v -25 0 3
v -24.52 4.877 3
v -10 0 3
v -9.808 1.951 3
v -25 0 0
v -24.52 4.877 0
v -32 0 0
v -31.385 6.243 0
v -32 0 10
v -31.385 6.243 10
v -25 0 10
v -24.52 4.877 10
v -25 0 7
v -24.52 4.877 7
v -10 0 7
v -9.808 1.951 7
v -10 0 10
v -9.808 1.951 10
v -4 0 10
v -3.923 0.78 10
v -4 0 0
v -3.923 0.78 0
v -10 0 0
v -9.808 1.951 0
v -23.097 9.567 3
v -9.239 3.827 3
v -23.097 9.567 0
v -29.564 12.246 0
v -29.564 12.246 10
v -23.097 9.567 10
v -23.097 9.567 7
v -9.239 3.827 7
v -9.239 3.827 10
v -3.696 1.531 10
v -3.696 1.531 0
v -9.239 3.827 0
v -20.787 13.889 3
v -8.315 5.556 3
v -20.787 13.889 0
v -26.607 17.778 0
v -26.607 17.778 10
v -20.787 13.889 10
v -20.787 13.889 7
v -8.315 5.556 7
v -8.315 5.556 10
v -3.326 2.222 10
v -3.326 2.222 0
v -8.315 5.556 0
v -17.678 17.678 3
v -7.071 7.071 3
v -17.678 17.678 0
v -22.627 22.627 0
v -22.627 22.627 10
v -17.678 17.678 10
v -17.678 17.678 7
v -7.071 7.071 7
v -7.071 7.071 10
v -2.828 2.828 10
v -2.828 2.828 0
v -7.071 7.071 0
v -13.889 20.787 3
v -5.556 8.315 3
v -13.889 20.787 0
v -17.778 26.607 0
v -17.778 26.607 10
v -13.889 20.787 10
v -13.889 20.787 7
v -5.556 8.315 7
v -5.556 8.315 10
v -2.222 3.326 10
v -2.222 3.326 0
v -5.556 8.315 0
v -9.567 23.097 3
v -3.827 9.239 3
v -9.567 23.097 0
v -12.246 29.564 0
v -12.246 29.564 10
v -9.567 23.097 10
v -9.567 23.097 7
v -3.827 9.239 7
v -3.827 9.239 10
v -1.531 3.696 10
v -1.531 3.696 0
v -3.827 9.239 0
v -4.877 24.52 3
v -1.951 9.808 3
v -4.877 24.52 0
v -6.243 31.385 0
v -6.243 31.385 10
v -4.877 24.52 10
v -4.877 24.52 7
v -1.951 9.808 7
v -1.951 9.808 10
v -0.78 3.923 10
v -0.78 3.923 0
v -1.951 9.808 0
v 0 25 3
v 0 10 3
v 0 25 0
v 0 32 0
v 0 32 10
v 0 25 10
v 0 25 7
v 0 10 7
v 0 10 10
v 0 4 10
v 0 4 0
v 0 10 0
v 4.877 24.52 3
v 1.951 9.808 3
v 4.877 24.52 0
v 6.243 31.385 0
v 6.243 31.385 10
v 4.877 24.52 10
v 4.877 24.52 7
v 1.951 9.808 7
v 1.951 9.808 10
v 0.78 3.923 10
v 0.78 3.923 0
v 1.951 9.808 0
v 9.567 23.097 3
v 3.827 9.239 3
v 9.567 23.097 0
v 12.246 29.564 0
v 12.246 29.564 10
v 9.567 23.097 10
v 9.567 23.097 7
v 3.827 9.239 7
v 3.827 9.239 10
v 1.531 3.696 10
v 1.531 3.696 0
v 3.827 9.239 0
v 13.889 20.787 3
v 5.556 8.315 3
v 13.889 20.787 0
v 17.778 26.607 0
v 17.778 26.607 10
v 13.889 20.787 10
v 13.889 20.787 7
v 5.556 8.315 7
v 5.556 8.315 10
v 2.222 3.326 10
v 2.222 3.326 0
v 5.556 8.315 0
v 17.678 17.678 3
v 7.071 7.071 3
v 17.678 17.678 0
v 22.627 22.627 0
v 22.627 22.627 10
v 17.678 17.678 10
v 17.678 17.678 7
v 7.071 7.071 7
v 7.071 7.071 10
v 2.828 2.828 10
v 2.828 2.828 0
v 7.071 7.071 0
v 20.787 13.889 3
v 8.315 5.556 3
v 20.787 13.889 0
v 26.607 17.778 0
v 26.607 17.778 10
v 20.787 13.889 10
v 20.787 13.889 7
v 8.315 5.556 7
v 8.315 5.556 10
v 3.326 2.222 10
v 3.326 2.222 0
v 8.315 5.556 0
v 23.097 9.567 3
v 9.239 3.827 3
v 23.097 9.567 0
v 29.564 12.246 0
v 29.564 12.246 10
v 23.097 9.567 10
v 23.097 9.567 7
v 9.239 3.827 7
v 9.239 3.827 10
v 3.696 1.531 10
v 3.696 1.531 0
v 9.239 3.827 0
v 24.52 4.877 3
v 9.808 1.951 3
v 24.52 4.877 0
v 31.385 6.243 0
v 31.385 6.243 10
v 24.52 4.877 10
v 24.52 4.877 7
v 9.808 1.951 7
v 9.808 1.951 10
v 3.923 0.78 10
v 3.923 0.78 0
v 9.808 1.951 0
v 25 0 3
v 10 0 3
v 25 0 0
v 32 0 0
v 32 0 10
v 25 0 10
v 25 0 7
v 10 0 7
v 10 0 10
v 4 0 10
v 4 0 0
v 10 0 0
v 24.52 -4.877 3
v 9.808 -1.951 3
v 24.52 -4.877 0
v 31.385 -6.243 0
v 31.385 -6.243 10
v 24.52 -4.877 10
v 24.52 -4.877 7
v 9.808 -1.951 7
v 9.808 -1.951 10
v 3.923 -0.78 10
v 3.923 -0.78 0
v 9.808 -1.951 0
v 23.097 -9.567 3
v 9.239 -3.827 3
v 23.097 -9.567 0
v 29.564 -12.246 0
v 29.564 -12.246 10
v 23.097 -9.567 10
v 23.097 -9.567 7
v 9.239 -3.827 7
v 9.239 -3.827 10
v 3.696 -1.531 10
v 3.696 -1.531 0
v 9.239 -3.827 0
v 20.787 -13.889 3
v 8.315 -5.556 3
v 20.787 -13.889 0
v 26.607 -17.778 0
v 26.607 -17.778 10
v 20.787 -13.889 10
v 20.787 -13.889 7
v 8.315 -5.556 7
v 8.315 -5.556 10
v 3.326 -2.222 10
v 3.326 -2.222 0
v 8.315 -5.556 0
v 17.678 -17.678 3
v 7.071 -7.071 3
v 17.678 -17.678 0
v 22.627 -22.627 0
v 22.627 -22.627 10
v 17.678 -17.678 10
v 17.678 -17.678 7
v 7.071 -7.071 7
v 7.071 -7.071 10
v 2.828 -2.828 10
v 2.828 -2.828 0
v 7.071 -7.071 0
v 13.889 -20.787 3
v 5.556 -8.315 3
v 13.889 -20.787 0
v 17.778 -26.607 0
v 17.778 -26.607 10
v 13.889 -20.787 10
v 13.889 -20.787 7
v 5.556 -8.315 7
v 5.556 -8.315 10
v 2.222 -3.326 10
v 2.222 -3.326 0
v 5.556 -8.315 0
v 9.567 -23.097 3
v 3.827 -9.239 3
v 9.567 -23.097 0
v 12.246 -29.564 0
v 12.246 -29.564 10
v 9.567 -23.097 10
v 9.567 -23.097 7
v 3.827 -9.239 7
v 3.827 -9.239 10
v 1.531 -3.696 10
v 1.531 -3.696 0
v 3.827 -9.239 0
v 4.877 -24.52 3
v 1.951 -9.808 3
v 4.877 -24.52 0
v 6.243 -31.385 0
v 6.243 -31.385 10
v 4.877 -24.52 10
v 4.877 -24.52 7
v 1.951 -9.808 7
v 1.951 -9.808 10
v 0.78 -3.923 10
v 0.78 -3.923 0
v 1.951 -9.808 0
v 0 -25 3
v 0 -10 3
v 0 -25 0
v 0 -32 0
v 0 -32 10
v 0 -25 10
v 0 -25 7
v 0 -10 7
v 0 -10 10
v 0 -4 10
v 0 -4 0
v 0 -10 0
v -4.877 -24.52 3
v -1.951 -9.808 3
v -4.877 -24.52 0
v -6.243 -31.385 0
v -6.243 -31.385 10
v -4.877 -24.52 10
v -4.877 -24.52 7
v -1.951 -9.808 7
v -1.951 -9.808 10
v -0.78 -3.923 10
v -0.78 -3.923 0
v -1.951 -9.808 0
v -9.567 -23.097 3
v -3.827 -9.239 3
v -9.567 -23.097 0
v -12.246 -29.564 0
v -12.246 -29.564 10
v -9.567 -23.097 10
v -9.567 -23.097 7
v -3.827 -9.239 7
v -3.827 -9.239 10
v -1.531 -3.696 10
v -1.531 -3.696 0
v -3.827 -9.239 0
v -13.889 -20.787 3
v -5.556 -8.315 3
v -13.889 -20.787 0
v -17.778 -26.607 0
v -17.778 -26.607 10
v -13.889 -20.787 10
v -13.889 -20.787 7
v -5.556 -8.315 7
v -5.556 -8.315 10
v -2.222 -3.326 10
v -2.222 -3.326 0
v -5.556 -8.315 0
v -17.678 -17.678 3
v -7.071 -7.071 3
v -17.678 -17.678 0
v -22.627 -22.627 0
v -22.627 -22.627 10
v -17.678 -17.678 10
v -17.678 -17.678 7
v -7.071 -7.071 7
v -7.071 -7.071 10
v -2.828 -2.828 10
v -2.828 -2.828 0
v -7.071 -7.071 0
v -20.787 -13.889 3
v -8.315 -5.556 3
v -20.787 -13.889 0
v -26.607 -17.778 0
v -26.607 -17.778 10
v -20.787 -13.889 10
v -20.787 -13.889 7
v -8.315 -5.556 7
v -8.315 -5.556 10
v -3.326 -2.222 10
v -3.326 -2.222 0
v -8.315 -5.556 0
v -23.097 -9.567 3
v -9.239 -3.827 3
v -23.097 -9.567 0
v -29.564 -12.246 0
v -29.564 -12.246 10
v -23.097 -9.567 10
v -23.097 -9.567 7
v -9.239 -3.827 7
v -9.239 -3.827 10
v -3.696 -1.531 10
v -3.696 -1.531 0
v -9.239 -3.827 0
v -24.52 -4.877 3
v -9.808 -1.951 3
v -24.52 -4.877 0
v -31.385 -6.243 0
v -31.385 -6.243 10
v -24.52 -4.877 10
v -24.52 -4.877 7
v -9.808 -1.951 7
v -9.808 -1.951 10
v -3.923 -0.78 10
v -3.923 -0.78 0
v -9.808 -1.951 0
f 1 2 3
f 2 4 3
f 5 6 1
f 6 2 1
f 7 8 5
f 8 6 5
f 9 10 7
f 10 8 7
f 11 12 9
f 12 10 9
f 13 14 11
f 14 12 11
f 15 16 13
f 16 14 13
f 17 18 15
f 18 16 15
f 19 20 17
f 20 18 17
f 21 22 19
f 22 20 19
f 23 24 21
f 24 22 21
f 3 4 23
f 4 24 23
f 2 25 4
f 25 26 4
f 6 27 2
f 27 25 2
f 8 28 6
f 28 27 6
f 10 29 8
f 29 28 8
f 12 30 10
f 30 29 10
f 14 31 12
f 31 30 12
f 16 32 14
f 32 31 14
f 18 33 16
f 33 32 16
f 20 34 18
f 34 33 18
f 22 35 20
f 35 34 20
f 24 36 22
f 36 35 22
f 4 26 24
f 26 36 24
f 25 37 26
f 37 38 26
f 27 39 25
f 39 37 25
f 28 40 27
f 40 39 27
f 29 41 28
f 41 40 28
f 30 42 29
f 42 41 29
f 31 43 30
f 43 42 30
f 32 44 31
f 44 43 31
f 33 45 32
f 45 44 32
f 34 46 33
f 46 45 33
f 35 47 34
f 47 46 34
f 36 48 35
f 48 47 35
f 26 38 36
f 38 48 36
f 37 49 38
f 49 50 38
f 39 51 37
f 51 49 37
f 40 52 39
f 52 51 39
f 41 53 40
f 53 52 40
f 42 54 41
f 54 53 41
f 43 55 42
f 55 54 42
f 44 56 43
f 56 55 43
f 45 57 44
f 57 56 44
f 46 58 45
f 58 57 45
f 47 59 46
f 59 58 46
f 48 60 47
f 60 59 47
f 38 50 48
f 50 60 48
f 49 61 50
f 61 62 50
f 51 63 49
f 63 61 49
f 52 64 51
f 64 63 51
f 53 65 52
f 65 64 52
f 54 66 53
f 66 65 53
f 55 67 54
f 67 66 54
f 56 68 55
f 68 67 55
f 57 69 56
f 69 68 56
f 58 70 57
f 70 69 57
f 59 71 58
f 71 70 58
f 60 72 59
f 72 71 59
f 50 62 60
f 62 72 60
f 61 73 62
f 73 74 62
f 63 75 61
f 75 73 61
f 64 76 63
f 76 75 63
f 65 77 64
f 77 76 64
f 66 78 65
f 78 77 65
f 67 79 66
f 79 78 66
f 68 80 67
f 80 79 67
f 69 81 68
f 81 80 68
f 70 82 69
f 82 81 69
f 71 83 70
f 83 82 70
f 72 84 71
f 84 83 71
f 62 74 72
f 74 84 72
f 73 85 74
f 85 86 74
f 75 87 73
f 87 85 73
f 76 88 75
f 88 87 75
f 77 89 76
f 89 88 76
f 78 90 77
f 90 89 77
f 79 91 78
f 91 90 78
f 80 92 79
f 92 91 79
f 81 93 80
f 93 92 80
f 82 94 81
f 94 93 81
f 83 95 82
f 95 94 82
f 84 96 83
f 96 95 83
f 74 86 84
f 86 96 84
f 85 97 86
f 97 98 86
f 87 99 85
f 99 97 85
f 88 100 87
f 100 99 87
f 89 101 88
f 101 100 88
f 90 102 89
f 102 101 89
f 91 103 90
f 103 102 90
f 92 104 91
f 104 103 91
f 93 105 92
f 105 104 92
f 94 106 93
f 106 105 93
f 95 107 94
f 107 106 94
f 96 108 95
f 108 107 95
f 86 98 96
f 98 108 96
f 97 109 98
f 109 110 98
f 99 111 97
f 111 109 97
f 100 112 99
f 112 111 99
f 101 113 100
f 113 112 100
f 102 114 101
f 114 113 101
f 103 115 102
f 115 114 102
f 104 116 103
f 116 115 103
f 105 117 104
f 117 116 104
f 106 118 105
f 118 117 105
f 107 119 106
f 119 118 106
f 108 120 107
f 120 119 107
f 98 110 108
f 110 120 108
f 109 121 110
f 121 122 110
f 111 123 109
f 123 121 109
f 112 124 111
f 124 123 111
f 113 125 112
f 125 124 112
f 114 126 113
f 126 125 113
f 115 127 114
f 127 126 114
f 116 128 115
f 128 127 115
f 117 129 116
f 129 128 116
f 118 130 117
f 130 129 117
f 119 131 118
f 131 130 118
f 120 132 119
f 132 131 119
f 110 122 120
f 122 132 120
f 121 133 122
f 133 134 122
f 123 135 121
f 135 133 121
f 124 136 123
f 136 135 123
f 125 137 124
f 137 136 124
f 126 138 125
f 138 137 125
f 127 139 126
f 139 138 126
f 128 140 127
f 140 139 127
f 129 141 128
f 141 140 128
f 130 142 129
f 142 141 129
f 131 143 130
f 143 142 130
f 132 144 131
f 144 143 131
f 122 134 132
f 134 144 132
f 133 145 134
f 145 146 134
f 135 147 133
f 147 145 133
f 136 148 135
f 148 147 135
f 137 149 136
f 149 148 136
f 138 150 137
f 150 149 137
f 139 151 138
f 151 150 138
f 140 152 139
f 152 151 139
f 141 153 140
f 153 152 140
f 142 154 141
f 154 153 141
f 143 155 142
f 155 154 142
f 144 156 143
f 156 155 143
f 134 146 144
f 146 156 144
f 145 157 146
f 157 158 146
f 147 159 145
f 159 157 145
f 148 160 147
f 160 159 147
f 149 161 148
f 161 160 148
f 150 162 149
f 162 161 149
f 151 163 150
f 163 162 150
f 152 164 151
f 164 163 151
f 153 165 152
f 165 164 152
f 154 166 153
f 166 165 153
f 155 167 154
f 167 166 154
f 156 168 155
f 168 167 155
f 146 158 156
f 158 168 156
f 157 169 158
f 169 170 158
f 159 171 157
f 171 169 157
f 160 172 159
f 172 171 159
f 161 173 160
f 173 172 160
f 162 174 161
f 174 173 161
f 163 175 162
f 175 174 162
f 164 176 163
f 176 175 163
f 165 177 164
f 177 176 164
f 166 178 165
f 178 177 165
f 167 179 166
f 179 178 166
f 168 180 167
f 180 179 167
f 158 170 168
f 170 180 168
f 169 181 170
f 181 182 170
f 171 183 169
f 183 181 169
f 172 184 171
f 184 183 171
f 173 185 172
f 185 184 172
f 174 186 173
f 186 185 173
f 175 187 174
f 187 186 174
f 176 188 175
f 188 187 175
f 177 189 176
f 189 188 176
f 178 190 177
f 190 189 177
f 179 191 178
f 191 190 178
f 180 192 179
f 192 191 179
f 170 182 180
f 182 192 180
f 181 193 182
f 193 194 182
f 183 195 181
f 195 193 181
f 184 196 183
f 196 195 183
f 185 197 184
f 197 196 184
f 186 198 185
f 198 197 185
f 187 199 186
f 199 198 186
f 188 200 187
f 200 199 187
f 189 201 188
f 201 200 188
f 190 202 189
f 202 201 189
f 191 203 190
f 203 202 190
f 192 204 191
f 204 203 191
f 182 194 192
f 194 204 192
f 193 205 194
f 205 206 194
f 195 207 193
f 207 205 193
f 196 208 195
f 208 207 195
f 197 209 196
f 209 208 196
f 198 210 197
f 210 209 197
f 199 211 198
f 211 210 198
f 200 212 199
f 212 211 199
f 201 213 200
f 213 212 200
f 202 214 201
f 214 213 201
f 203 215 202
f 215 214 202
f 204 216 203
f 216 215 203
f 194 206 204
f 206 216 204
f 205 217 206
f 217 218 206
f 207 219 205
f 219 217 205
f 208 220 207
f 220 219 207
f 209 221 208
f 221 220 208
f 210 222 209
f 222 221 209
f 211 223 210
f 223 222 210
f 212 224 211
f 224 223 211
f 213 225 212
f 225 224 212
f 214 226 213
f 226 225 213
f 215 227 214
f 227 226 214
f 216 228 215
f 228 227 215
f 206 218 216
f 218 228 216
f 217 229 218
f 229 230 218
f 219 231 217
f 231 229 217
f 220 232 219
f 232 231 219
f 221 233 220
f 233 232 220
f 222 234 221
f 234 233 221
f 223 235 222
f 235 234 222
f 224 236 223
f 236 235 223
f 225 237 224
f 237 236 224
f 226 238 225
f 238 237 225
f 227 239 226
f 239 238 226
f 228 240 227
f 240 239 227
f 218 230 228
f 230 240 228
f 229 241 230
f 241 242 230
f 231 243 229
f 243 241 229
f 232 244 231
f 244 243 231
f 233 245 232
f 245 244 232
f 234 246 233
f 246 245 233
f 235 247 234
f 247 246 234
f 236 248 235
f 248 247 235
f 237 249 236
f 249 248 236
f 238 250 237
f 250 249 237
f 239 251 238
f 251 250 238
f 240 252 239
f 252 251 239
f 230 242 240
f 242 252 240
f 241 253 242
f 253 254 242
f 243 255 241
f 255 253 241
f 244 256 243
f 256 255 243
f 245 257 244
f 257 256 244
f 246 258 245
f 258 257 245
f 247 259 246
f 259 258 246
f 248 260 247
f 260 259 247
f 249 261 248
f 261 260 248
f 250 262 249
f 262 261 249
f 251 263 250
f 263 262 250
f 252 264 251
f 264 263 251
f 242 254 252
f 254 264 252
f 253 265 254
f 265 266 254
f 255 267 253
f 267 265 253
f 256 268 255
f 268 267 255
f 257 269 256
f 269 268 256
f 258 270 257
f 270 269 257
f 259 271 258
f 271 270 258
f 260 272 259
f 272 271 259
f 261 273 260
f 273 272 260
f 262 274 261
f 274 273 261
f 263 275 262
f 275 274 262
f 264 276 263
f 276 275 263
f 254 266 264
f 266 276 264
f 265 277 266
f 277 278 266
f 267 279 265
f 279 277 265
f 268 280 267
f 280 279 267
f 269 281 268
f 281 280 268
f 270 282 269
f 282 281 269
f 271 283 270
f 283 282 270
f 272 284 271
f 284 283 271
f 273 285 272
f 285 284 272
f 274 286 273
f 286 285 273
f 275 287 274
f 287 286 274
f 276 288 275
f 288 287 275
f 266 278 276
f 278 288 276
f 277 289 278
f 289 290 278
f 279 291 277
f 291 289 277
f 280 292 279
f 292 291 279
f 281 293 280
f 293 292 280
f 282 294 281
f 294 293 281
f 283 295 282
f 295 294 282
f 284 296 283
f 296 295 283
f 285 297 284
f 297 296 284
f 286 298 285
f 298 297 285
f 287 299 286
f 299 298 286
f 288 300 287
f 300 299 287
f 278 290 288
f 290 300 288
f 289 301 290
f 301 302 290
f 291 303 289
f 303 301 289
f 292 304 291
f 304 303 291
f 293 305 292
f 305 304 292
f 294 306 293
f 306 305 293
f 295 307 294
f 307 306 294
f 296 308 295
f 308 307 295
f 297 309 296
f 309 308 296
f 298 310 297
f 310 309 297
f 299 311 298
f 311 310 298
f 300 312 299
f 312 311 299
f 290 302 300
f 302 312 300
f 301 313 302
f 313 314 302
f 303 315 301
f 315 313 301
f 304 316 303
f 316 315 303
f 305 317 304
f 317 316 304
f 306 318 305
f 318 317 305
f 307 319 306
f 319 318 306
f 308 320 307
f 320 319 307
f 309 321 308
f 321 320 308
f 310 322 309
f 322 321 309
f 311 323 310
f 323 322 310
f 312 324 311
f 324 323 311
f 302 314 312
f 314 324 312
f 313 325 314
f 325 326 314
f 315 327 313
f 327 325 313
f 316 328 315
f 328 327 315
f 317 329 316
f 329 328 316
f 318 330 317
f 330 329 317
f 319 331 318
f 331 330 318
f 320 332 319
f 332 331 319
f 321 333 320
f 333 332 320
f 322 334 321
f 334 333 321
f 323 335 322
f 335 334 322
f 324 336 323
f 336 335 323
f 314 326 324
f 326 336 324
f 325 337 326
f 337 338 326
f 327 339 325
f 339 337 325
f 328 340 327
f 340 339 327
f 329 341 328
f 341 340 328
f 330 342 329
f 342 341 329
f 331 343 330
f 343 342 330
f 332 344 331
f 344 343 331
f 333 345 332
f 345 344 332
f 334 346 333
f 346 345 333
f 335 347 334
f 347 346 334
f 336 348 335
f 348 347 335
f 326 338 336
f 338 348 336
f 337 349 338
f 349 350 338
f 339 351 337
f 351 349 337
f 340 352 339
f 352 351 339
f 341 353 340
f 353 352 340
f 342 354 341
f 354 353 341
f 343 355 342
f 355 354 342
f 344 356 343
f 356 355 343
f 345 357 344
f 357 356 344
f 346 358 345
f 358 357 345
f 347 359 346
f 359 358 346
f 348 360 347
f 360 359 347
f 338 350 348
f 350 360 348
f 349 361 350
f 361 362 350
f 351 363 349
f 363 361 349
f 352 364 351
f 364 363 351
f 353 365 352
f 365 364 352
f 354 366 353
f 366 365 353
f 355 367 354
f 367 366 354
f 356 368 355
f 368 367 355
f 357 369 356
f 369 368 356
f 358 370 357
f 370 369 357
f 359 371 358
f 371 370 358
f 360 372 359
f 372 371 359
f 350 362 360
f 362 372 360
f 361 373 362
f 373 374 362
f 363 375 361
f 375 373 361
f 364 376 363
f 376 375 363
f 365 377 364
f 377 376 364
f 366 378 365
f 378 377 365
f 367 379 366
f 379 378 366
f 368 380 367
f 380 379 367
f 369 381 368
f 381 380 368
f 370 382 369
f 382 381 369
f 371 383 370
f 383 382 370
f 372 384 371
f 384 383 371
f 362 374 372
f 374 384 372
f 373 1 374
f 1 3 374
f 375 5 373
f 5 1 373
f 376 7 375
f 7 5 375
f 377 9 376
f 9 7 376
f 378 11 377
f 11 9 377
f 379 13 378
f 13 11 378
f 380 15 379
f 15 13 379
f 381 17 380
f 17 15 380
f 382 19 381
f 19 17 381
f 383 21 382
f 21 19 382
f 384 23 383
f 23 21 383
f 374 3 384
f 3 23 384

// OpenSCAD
$fn = 32;

// ----------------------------------------------------------------------
// Revolved part: handwheel R32
// ----------------------------------------------------------------------

// --- parameters (mm) ---
bore_r = 4;               // bore radius
rim_r = 32;               // rim radius
rim_w = 7;                // rim axial width
rim_t = 10;               // rim diameter height
hub_r = 10;               // hub radius
web_t = 4;                // web thickness
revolve_angle = 360;      // revolve sweep, degrees

bore_d = 2 * bore_r;
rim_d = 2 * rim_r;
hub_d = 2 * hub_r;

profile = [[4, 0], [10, 0], [10, 3], [25, 3], [25, 0], [32, 0], [32, 10], [25, 10], [25, 7], [10, 7], [10, 10], [4, 10]];  // primary outline, 12 points, counter clockwise

// --- the one profile operation ---
rotate_extrude(angle = revolve_angle) polygon(points = profile);
